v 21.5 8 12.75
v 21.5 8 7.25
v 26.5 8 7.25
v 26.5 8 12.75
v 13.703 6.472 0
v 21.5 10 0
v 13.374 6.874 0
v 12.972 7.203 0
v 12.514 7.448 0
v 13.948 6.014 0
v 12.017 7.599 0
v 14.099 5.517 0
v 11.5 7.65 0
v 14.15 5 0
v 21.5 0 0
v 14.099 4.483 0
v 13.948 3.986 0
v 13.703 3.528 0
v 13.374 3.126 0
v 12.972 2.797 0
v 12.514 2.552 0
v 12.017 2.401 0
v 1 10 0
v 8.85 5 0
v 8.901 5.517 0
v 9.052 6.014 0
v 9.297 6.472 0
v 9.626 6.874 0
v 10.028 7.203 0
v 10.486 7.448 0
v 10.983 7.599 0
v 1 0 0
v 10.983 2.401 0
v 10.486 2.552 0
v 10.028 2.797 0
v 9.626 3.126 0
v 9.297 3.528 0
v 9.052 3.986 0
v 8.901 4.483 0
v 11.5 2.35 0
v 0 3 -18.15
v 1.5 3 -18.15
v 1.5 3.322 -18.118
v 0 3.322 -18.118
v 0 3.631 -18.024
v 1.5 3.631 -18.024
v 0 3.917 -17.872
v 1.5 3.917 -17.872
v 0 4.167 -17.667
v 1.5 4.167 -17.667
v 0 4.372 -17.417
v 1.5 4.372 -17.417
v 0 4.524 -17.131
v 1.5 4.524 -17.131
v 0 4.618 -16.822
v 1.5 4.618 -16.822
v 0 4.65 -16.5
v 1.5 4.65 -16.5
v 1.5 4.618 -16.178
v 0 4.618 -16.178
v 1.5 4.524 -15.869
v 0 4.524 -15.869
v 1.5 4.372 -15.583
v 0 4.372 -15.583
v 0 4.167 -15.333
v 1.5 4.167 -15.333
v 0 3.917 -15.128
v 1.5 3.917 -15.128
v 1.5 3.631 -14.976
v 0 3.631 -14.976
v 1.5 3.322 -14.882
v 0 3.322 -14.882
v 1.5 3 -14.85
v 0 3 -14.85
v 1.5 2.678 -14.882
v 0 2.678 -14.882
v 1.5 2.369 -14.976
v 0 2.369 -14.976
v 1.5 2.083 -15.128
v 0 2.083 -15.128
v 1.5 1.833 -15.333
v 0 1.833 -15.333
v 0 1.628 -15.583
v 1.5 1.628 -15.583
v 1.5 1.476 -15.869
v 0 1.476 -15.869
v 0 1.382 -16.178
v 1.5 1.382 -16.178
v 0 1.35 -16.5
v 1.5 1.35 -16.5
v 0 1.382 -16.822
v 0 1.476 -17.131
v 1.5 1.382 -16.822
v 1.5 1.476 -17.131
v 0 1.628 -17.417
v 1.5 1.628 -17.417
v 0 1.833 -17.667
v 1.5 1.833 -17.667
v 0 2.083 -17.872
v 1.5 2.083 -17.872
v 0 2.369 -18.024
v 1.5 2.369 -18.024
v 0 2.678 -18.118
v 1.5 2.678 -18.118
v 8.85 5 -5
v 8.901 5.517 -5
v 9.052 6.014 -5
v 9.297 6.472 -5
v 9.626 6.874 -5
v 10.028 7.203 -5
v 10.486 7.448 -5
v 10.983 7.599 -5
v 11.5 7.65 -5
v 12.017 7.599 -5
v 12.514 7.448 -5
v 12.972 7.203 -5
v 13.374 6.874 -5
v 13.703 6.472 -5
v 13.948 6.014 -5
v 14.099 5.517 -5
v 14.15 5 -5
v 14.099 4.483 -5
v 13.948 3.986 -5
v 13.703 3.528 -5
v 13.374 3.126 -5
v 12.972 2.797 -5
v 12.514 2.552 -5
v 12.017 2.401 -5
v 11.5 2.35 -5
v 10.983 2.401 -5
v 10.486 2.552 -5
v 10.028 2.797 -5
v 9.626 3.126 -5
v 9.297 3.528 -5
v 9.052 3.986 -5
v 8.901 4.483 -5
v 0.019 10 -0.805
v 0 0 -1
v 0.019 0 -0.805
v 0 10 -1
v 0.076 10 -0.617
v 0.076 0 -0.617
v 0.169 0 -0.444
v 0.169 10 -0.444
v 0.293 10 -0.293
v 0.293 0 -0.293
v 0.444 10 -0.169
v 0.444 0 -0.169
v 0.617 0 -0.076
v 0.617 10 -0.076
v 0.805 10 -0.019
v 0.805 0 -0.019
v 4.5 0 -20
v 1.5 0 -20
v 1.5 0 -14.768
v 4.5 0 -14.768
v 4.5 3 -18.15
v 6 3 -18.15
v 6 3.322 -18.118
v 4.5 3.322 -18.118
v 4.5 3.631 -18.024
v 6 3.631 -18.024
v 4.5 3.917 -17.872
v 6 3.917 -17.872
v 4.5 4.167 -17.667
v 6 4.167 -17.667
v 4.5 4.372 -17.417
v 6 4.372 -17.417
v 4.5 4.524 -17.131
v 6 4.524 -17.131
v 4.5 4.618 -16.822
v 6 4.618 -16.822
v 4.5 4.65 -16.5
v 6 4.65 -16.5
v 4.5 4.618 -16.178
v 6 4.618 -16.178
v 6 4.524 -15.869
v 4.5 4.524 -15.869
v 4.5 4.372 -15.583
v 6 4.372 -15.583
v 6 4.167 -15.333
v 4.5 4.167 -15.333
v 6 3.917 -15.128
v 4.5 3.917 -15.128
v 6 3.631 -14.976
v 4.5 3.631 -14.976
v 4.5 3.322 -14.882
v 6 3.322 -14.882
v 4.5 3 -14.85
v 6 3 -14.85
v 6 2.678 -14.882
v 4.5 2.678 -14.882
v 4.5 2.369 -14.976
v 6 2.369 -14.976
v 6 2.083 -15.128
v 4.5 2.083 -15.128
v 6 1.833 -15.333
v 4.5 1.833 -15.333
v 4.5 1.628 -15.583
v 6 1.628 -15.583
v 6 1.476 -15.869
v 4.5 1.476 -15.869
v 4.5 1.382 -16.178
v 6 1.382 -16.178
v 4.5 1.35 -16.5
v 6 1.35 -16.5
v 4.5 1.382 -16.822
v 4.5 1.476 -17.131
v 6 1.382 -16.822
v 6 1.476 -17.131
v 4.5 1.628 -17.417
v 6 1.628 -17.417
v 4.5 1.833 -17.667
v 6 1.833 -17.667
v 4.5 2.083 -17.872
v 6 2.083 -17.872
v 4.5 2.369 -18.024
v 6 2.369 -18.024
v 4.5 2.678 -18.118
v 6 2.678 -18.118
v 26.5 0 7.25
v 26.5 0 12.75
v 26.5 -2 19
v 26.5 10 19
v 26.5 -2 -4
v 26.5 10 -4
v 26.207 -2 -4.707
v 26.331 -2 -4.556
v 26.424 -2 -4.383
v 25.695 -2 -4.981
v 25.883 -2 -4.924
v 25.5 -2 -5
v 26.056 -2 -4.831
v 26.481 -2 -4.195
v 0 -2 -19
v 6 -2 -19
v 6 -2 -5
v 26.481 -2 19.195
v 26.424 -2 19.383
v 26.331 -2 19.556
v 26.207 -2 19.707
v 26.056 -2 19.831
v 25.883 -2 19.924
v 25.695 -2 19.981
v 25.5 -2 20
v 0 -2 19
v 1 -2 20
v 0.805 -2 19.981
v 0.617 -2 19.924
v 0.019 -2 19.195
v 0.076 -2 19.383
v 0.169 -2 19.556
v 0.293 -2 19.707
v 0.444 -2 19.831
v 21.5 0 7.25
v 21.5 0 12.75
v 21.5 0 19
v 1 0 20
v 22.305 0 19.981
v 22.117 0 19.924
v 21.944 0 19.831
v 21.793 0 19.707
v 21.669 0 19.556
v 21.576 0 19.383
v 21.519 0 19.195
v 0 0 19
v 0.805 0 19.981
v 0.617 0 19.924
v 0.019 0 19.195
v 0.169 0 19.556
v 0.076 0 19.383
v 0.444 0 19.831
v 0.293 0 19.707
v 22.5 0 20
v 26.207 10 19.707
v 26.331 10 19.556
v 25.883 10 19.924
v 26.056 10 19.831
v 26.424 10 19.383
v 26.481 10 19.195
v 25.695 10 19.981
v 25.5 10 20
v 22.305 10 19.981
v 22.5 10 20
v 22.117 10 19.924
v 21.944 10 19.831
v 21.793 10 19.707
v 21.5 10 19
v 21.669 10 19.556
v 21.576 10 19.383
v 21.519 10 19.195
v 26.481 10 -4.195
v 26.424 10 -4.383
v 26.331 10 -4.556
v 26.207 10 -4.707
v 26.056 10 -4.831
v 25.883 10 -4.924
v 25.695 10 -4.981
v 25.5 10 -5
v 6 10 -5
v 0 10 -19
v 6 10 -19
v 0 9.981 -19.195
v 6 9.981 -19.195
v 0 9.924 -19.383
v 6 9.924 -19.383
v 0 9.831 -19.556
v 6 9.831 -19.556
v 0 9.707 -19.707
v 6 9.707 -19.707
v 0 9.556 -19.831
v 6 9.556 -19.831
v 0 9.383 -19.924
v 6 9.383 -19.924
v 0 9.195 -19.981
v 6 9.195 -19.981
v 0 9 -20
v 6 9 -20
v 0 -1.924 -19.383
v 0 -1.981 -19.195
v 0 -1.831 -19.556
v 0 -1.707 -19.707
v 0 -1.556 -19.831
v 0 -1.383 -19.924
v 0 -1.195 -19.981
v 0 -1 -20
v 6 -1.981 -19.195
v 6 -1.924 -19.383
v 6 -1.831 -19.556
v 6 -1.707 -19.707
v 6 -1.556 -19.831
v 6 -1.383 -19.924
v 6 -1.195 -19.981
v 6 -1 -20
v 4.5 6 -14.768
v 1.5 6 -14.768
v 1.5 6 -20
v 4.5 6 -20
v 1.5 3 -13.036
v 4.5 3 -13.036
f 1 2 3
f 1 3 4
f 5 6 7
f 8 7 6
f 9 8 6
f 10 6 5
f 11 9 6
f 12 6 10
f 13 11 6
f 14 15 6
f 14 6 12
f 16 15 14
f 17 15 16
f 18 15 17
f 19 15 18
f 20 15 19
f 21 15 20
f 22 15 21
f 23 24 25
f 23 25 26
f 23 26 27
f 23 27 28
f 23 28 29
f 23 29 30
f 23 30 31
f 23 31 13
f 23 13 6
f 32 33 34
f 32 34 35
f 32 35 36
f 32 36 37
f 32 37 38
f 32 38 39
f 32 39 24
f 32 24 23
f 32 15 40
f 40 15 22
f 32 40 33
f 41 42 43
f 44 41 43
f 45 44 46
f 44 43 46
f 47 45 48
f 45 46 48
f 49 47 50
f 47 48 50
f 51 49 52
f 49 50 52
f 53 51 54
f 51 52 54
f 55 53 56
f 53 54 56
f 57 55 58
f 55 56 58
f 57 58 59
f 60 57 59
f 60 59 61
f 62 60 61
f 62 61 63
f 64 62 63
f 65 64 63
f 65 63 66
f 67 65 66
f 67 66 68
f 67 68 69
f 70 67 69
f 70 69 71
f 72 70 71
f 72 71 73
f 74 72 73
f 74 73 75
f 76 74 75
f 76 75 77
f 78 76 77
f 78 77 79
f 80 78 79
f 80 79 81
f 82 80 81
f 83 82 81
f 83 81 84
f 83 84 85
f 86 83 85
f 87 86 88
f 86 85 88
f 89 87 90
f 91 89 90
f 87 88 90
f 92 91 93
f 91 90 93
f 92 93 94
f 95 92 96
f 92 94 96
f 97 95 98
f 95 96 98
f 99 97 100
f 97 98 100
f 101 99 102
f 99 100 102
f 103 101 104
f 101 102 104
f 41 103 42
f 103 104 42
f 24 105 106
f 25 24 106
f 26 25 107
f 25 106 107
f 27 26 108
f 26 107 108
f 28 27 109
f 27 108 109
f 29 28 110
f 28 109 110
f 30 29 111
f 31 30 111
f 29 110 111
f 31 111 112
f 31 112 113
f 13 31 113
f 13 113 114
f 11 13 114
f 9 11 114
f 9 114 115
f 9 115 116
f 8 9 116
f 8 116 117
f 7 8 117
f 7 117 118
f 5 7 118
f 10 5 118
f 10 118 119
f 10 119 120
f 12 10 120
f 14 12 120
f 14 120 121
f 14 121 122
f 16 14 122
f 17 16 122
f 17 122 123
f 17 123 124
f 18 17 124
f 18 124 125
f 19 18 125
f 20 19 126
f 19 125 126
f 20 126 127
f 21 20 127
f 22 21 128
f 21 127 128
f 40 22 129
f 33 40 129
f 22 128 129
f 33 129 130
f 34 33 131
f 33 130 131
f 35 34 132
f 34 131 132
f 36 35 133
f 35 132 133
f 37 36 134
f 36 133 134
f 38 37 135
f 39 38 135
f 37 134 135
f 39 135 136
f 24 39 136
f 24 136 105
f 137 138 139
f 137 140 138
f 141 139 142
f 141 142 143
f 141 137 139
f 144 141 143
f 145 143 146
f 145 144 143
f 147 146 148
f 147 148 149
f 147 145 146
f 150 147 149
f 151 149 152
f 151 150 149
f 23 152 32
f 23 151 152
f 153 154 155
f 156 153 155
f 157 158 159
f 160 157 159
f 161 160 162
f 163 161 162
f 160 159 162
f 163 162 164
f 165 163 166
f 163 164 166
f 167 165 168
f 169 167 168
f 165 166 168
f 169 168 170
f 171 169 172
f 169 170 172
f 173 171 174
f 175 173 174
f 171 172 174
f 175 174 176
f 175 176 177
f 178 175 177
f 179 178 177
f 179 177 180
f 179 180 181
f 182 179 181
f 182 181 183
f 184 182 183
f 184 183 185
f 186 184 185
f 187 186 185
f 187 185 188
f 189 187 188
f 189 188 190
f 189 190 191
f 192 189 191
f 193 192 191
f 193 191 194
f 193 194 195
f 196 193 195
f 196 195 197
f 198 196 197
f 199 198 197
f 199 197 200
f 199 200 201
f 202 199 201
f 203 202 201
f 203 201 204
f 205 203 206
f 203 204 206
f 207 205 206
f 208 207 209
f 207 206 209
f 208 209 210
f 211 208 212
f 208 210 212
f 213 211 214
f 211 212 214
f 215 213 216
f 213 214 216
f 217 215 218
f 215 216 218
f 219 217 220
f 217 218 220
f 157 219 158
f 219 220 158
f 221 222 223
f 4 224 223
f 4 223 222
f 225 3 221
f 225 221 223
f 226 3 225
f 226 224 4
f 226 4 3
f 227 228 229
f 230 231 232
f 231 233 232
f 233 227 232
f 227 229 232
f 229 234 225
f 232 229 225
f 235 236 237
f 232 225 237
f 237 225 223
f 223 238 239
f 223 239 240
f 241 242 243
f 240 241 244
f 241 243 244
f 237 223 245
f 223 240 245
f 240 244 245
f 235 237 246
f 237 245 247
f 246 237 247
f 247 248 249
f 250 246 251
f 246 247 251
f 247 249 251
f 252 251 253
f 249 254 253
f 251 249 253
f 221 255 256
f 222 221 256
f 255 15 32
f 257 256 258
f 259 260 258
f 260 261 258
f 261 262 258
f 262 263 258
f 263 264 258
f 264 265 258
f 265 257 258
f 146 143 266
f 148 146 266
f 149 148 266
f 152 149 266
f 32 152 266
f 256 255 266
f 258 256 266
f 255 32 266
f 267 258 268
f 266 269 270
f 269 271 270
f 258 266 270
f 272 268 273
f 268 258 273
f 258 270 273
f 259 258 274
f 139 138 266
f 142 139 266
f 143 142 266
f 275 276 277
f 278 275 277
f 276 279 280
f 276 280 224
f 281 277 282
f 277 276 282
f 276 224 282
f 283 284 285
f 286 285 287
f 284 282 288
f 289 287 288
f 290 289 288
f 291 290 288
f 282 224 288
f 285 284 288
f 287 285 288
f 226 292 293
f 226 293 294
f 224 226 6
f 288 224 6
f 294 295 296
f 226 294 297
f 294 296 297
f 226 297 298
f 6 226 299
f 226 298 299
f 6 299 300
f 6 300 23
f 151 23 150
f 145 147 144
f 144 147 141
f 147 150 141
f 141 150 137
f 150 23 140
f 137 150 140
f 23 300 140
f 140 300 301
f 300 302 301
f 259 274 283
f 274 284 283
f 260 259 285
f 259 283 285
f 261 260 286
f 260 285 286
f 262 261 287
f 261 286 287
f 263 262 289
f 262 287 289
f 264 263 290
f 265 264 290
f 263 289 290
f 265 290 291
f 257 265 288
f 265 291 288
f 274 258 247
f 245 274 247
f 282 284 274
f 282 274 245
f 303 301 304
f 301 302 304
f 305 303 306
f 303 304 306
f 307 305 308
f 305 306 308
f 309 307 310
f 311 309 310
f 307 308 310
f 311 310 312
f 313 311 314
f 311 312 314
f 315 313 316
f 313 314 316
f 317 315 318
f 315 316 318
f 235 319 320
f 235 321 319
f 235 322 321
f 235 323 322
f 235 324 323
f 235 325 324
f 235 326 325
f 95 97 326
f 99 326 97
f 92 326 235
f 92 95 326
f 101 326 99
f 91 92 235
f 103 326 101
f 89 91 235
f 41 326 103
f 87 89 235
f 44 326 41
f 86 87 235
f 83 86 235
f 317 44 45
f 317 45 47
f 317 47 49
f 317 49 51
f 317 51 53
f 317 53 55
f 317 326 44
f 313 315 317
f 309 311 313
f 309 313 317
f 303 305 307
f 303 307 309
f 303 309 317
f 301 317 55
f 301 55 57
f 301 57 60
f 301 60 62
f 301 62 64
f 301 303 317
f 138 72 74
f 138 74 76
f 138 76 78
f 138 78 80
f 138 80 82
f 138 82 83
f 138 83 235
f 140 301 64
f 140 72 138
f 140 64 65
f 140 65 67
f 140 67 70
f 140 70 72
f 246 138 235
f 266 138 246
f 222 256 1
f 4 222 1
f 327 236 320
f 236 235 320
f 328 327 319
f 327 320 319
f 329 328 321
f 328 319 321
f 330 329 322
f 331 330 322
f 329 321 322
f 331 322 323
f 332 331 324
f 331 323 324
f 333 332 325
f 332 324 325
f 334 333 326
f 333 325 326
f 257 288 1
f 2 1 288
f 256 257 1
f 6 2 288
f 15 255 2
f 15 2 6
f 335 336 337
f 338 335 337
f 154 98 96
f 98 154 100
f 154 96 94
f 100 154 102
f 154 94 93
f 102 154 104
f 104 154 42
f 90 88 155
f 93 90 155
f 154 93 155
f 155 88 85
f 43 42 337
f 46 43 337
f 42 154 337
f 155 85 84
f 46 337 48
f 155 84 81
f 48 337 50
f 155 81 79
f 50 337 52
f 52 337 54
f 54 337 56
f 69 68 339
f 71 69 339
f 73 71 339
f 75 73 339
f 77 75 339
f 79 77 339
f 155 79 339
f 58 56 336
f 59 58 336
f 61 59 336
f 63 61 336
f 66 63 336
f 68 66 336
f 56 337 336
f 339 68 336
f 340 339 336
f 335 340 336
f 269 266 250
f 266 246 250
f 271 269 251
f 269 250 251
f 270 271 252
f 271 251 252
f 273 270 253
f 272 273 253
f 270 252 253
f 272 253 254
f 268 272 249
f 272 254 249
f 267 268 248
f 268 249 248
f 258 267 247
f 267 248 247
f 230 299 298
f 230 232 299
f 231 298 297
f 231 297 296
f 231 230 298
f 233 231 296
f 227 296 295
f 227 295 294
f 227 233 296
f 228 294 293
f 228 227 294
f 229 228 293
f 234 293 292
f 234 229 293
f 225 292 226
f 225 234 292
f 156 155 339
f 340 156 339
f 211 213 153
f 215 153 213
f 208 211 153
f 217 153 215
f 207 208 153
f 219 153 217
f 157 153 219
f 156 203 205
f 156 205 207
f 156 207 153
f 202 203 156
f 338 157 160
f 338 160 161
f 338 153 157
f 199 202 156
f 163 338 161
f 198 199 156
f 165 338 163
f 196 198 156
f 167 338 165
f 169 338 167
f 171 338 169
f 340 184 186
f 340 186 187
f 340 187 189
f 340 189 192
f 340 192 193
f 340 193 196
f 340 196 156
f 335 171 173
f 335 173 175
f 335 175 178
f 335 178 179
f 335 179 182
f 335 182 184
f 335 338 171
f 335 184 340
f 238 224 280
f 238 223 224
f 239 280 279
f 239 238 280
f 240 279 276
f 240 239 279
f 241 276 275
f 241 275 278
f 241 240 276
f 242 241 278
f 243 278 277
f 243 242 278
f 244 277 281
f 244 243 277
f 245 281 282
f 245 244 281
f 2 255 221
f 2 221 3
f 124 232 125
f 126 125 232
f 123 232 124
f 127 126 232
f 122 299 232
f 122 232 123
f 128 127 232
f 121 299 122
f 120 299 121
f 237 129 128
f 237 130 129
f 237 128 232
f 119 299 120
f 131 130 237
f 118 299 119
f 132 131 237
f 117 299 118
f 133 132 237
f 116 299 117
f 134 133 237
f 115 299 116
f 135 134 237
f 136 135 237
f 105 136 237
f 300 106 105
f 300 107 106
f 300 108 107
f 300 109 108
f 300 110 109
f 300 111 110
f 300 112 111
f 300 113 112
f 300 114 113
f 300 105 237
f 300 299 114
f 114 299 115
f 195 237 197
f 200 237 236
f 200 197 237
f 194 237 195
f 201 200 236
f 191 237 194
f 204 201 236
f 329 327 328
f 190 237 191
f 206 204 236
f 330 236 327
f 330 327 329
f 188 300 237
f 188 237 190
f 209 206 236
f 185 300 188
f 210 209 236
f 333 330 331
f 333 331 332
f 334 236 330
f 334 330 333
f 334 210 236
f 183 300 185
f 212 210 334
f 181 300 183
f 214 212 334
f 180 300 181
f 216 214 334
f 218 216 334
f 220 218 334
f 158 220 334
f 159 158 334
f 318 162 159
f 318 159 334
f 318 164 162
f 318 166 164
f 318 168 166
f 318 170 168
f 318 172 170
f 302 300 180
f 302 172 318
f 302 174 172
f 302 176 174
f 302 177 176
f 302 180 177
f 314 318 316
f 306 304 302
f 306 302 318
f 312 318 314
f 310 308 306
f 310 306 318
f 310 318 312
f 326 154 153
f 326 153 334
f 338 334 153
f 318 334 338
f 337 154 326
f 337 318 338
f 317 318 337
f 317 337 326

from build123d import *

# Parameters (mm, degrees)
RESSALTO_EXTRUS_O1_DEPTH = 10
RESSALTO_EXTRUS_O2_DEPTH = 2
ESBO_O2_W                = 5.5
ESBO_O2_H                = 8
CORTE_EXTRUS_O1_DEPTH    = 10
ESBO_O3_R                = 1.65
CORTE_EXTRUS_O2_DEPTH    = 10
ESBO_O4_R                = 2.65
CORTE_EXTRUS_O3_DEPTH    = 10
CORTE_EXTRUS_O4_START    = -1.5
CORTE_EXTRUS_O4_DEPTH    = 3
FILETE1_R                = 1


with BuildPart() as part:
    # Esboço1 → Ressalto-extrusão1 (new body)
    with BuildSketch(Plane(origin=(0, 0, 0), x_dir=(1, 0, 0), z_dir=(0, 1, 0))):
        Polygon((0, 0), (0, 20), (6, 20), (6, 5), (26.5, 5), (26.5, -20), (21.5, -20), (21.5, 0), align=None)
    extrude(amount=RESSALTO_EXTRUS_O1_DEPTH)

    # Esboço8 → Ressalto-extrusão2 (add)
    with BuildSketch(Plane.XZ):
        Polygon((26.5, -5), (6, -5), (6, -20), (0, -20), (0, 20), (26.5, 20), align=None)
    extrude(amount=RESSALTO_EXTRUS_O2_DEPTH)

    # Esboço2 → Corte-extrusão1 (cut)
    with BuildSketch(Plane.ZY.offset(-21.5)):
        with Locations((10, 4)):
            Rectangle(ESBO_O2_W, ESBO_O2_H)
    extrude(amount=-CORTE_EXTRUS_O1_DEPTH, mode=Mode.SUBTRACT)

    # Esboço3 → Corte-extrusão2 (cut)
    with BuildSketch(Plane(origin=(6, 0, 0), x_dir=(0, 0, -1), z_dir=(1, 0, 0))):
        with Locations((16.5, 3)):
            Circle(ESBO_O3_R)
    extrude(amount=-CORTE_EXTRUS_O2_DEPTH, mode=Mode.SUBTRACT)

    # Esboço4 → Corte-extrusão3 (cut)
    with BuildSketch(Plane(origin=(0, 0, -5), x_dir=(-1, 0, 0), z_dir=(0, 0, -1))):
        with Locations((-11.5, 5)):
            Circle(ESBO_O4_R)
    extrude(amount=-CORTE_EXTRUS_O3_DEPTH, mode=Mode.SUBTRACT)

    # Esboço7 → Corte-extrusão4 (cut)
    with BuildSketch(Plane.ZY.offset(CORTE_EXTRUS_O4_START)):
        Polygon((-13.035898385, 3), (-14.767949192, 6), (-18.232050808, 6), (-20, 6), (-20, 0), (-18.232050808, 0), (-14.767949192, 0), align=None)
    extrude(amount=-CORTE_EXTRUS_O4_DEPTH, mode=Mode.SUBTRACT)

    # Filete1
    filete1_edges = [part.edges().sort_by_distance(p)[0] for p in [
        (3, 10, -20),
        (21.5, 5, 20),
        (26.5, 4, 20),
        (26.5, 4, -5),
        (0, 5, 0),
        (0, -1, 20),
        (3, -2, -20),
    ]]
    fillet(filete1_edges, radius=FILETE1_R)


solid = part.part
